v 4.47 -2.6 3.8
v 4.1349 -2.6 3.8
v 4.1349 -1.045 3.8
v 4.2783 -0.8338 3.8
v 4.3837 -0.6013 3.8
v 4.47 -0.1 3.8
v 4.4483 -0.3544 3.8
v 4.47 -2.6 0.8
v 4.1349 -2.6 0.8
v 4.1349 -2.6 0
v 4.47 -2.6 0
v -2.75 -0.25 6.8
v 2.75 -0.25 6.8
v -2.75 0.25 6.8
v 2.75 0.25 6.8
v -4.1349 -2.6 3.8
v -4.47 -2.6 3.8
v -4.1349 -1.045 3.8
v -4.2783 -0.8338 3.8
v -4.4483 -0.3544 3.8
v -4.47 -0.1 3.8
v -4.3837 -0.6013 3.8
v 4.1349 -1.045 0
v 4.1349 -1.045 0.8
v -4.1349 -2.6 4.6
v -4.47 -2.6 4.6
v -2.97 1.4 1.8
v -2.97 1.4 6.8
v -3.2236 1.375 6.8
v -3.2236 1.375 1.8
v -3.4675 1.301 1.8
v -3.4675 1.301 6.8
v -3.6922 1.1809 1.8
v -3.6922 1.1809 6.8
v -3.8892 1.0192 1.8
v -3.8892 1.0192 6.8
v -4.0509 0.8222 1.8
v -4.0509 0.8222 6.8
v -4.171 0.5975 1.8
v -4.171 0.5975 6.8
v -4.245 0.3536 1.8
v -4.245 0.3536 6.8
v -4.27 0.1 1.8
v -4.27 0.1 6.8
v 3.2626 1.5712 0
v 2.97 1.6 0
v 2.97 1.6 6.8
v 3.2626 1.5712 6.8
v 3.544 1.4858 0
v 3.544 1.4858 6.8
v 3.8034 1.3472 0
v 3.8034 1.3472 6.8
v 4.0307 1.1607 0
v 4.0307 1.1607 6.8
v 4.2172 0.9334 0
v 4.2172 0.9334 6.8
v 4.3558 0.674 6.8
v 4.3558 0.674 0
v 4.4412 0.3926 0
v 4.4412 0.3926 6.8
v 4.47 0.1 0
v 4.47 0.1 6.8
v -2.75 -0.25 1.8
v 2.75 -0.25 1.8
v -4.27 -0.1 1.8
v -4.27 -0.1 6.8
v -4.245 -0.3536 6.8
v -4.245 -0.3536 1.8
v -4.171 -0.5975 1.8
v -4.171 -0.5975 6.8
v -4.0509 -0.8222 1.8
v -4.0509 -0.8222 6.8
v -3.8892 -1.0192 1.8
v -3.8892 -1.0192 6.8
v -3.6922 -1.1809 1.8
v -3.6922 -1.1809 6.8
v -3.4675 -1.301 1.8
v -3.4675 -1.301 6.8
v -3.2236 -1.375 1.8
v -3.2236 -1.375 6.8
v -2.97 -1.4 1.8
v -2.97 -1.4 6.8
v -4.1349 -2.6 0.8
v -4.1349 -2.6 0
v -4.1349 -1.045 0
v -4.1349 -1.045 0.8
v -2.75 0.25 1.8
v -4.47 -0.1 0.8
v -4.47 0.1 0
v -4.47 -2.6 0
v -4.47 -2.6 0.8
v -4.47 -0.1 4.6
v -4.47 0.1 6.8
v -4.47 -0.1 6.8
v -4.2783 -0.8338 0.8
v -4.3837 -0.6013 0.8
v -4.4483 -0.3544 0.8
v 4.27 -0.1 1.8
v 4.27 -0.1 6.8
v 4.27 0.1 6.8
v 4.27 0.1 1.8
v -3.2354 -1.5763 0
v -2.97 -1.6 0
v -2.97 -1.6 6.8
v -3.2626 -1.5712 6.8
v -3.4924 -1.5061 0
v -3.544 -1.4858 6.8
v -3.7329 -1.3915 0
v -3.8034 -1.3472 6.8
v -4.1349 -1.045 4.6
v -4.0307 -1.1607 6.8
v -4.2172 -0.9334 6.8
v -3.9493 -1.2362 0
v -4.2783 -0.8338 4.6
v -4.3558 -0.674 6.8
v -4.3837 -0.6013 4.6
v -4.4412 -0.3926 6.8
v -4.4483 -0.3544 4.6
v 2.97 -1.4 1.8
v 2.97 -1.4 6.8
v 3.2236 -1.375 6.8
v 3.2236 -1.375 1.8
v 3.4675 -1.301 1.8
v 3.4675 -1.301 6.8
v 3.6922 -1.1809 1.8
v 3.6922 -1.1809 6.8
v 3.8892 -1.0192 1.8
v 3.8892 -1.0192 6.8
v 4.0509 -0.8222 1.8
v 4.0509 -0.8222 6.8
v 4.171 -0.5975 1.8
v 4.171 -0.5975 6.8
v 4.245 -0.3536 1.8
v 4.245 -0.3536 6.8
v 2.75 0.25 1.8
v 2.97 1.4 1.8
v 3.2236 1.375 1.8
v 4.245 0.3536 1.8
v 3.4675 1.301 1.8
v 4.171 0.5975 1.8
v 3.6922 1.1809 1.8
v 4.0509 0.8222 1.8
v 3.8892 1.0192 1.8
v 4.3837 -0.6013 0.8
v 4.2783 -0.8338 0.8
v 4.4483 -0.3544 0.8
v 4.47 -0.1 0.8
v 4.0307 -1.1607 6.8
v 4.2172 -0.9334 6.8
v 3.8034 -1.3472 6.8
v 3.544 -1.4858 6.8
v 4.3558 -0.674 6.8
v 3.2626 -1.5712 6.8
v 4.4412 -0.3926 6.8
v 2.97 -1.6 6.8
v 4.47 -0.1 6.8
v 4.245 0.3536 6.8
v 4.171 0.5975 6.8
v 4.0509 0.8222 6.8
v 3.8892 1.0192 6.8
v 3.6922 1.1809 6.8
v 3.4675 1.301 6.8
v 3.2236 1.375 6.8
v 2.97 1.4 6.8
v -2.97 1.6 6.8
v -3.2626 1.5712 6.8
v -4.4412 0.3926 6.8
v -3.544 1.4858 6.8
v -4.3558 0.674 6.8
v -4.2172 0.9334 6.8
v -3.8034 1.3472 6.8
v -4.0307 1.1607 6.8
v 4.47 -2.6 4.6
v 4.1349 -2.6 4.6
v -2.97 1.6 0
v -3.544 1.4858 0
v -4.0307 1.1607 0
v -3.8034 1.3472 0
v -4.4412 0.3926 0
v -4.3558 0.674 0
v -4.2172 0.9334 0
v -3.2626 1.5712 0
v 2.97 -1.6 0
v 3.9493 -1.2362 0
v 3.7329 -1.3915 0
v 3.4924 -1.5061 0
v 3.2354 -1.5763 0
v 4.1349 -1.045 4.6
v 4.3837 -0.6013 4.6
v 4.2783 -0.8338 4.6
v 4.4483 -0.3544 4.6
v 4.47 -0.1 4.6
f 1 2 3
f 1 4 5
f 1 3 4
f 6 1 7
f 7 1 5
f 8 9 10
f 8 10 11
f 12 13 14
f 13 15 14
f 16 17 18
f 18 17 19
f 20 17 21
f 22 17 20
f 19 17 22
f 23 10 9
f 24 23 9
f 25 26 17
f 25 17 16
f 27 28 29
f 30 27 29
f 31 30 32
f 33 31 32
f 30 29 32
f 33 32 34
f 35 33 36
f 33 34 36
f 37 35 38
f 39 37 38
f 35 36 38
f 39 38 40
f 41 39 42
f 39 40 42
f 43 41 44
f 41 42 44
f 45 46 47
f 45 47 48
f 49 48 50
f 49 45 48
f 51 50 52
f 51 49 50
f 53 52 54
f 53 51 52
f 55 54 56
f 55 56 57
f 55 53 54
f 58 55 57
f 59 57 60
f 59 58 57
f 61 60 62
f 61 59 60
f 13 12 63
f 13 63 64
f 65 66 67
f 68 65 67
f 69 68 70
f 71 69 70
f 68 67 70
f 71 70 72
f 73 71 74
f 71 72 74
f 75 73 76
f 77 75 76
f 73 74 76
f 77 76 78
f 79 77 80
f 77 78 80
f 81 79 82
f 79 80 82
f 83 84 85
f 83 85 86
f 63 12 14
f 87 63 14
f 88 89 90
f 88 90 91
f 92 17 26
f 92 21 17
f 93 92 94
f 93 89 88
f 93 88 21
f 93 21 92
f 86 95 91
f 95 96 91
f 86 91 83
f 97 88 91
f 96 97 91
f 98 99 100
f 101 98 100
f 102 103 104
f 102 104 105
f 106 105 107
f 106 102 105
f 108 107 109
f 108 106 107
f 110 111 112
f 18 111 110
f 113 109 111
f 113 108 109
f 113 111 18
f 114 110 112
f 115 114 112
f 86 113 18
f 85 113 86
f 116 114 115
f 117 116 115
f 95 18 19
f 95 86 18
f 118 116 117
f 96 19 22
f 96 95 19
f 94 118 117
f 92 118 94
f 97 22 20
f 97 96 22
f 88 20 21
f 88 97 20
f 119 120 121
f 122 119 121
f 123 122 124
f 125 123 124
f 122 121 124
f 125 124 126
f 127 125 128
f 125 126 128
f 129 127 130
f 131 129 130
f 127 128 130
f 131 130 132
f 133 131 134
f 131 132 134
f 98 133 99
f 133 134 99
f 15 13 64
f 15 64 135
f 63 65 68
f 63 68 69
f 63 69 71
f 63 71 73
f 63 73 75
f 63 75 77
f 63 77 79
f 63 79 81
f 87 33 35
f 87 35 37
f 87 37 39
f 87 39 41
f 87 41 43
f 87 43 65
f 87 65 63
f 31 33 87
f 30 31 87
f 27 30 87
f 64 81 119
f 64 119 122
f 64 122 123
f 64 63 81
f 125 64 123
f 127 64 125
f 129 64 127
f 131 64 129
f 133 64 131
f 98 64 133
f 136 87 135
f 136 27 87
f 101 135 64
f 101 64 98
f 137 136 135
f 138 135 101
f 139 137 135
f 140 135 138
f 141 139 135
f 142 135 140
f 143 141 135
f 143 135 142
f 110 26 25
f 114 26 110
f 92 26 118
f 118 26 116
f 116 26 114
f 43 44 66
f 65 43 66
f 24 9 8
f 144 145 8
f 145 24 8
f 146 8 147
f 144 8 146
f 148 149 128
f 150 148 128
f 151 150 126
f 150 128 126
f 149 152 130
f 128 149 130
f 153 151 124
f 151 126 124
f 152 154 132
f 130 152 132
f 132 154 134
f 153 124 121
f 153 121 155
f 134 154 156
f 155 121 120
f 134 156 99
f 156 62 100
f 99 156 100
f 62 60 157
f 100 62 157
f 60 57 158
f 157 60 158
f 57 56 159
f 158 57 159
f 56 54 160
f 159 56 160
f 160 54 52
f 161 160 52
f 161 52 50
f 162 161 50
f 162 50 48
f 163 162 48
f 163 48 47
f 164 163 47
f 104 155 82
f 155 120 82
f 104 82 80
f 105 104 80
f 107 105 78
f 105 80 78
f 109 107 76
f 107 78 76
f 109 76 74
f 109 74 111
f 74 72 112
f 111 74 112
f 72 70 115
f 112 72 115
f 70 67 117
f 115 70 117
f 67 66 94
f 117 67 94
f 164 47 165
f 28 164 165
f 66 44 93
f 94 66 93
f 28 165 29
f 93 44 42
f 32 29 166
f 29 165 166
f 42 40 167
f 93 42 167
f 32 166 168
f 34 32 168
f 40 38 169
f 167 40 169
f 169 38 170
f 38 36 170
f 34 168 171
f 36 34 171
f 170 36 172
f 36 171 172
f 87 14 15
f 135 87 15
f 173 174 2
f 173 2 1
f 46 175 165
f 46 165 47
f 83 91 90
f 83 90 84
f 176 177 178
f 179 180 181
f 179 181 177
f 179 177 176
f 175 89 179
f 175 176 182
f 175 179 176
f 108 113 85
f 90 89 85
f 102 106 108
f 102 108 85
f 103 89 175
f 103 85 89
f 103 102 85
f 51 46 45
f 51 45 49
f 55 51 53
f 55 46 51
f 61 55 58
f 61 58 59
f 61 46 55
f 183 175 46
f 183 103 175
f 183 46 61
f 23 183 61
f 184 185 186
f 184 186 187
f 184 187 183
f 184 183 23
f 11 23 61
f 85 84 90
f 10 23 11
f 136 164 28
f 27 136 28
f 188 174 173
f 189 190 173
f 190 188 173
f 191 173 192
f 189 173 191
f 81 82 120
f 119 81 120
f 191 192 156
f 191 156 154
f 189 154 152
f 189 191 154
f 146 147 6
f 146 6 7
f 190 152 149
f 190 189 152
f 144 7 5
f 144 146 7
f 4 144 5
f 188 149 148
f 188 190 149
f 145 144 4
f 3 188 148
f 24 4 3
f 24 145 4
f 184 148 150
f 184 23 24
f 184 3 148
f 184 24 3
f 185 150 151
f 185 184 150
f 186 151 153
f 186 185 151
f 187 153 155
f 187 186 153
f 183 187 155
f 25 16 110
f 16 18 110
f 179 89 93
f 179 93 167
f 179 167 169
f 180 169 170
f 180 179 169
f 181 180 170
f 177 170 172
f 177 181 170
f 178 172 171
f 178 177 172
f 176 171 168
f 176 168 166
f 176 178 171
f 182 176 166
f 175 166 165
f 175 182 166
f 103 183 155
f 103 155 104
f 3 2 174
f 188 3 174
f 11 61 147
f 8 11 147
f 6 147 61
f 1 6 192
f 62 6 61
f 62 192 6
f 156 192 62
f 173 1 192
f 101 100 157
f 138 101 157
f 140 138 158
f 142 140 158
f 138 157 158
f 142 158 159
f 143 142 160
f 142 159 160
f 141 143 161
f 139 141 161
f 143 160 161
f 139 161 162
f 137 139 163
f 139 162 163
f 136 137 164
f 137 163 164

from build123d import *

# Parameters (mm, degrees)
BOSS_EXTRUDE1_DEPTH             = 6.8
BOSS_EXTRUDE2_REACH             = 10.744
SKETCH2_W                       = 0.335114676
SKETCH2_H                       = 0.8
BOSS_EXTRUDE2_DIRECTION_2_DEPTH = 1
SKETCH3_W                       = 5.5
SKETCH3_H                       = 0.5
CUT_EXTRUDE1_DEPTH              = 5


with BuildPart() as part:
    # Sketch1 → Boss-Extrude1 (new body)
    with BuildSketch(Plane.XY):
        with BuildLine():
            Line((-2.97, 1.6), (2.97, 1.6))
            ThreePointArc((2.97, 1.6), (4.030660172, 1.160660172), (4.47, 0.1))
            Line((4.47, 0.1), (4.47, -0.1))
            ThreePointArc((4.47, -0.1), (4.030660172, -1.160660172), (2.97, -1.6))
            Line((2.97, -1.6), (-2.97, -1.6))
            ThreePointArc((-2.97, -1.6), (-4.030660172, -1.160660172), (-4.47, -0.1))
            Line((-4.47, -0.1), (-4.47, 0.1))
            ThreePointArc((-4.47, 0.1), (-4.030660172, 1.160660172), (-2.97, 1.6))
        make_face()
    extrude(amount=BOSS_EXTRUDE1_DEPTH)

    # Sketch2 → Boss-Extrude2 (add, up to next)
    with BuildSketch(Plane.XZ.offset(1.6), mode=Mode.PRIVATE) as boss_extrude2_sk1:
        with Locations((-4.302442662, 4.2)):
            Rectangle(SKETCH2_W, SKETCH2_H)
    boss_extrude2_tool1 = extrude(boss_extrude2_sk1.sketch, amount=-BOSS_EXTRUDE2_REACH, mode=Mode.PRIVATE) - part.part
    # Sketch2 → Boss-Extrude2 (add, up to next)
    with BuildSketch(Plane.XZ.offset(1.6), mode=Mode.PRIVATE) as boss_extrude2_sk2:
        with Locations((-4.302442662, 0.4)):
            Rectangle(SKETCH2_W, SKETCH2_H)
    boss_extrude2_tool2 = extrude(boss_extrude2_sk2.sketch, amount=-BOSS_EXTRUDE2_REACH, mode=Mode.PRIVATE) - part.part
    # Sketch2 → Boss-Extrude2 (add, up to next)
    with BuildSketch(Plane.XZ.offset(1.6), mode=Mode.PRIVATE) as boss_extrude2_sk3:
        with Locations((4.302442662, 0.4)):
            Rectangle(SKETCH2_W, SKETCH2_H)
    boss_extrude2_tool3 = extrude(boss_extrude2_sk3.sketch, amount=-BOSS_EXTRUDE2_REACH, mode=Mode.PRIVATE) - part.part
    # Sketch2 → Boss-Extrude2 (add, up to next)
    with BuildSketch(Plane.XZ.offset(1.6), mode=Mode.PRIVATE) as boss_extrude2_sk4:
        with Locations((4.302442662, 4.2)):
            Rectangle(SKETCH2_W, SKETCH2_H)
    boss_extrude2_tool4 = extrude(boss_extrude2_sk4.sketch, amount=-BOSS_EXTRUDE2_REACH, mode=Mode.PRIVATE) - part.part
    add(boss_extrude2_tool1.solids().sort_by_distance((-4.302443, -1.6, 4.2))[0])
    add(boss_extrude2_tool2.solids().sort_by_distance((-4.302443, -1.6, 0.4))[0])
    add(boss_extrude2_tool3.solids().sort_by_distance((4.302443, -1.6, 0.4))[0])
    add(boss_extrude2_tool4.solids().sort_by_distance((4.302443, -1.6, 4.2))[0])

    # Sketch2 → Boss-Extrude2 direction 2 (add)
    with BuildSketch(Plane.XZ.offset(1.6)):
        with Locations((-4.302442662, 4.2)):
            Rectangle(SKETCH2_W, SKETCH2_H)
        with Locations((-4.302442662, 0.4)):
            Rectangle(SKETCH2_W, SKETCH2_H)
        with Locations((4.302442662, 0.4)):
            Rectangle(SKETCH2_W, SKETCH2_H)
        with Locations((4.302442662, 4.2)):
            Rectangle(SKETCH2_W, SKETCH2_H)
    extrude(amount=BOSS_EXTRUDE2_DIRECTION_2_DEPTH)

    # Sketch3 → Cut-Extrude1 (cut)
    with BuildSketch(Plane.XY.offset(6.8)):
        with BuildLine():
            Line((-2.97, -1.4), (2.97, -1.4))
            ThreePointArc((2.97, -1.4), (3.889238816, -1.019238816), (4.27, -0.1))
            Line((4.27, -0.1), (4.27, 0.1))
            ThreePointArc((4.27, 0.1), (3.889238816, 1.019238816), (2.97, 1.4))
            Line((2.97, 1.4), (-2.97, 1.4))
            ThreePointArc((-2.97, 1.4), (-3.889238816, 1.019238816), (-4.27, 0.1))
            Line((-4.27, 0.1), (-4.27, -0.1))
            ThreePointArc((-4.27, -0.1), (-3.889238816, -1.019238816), (-2.97, -1.4))
        make_face()
        Rectangle(SKETCH3_W, SKETCH3_H, mode=Mode.SUBTRACT)
    extrude(amount=-CUT_EXTRUDE1_DEPTH, mode=Mode.SUBTRACT)


solid = part.part
